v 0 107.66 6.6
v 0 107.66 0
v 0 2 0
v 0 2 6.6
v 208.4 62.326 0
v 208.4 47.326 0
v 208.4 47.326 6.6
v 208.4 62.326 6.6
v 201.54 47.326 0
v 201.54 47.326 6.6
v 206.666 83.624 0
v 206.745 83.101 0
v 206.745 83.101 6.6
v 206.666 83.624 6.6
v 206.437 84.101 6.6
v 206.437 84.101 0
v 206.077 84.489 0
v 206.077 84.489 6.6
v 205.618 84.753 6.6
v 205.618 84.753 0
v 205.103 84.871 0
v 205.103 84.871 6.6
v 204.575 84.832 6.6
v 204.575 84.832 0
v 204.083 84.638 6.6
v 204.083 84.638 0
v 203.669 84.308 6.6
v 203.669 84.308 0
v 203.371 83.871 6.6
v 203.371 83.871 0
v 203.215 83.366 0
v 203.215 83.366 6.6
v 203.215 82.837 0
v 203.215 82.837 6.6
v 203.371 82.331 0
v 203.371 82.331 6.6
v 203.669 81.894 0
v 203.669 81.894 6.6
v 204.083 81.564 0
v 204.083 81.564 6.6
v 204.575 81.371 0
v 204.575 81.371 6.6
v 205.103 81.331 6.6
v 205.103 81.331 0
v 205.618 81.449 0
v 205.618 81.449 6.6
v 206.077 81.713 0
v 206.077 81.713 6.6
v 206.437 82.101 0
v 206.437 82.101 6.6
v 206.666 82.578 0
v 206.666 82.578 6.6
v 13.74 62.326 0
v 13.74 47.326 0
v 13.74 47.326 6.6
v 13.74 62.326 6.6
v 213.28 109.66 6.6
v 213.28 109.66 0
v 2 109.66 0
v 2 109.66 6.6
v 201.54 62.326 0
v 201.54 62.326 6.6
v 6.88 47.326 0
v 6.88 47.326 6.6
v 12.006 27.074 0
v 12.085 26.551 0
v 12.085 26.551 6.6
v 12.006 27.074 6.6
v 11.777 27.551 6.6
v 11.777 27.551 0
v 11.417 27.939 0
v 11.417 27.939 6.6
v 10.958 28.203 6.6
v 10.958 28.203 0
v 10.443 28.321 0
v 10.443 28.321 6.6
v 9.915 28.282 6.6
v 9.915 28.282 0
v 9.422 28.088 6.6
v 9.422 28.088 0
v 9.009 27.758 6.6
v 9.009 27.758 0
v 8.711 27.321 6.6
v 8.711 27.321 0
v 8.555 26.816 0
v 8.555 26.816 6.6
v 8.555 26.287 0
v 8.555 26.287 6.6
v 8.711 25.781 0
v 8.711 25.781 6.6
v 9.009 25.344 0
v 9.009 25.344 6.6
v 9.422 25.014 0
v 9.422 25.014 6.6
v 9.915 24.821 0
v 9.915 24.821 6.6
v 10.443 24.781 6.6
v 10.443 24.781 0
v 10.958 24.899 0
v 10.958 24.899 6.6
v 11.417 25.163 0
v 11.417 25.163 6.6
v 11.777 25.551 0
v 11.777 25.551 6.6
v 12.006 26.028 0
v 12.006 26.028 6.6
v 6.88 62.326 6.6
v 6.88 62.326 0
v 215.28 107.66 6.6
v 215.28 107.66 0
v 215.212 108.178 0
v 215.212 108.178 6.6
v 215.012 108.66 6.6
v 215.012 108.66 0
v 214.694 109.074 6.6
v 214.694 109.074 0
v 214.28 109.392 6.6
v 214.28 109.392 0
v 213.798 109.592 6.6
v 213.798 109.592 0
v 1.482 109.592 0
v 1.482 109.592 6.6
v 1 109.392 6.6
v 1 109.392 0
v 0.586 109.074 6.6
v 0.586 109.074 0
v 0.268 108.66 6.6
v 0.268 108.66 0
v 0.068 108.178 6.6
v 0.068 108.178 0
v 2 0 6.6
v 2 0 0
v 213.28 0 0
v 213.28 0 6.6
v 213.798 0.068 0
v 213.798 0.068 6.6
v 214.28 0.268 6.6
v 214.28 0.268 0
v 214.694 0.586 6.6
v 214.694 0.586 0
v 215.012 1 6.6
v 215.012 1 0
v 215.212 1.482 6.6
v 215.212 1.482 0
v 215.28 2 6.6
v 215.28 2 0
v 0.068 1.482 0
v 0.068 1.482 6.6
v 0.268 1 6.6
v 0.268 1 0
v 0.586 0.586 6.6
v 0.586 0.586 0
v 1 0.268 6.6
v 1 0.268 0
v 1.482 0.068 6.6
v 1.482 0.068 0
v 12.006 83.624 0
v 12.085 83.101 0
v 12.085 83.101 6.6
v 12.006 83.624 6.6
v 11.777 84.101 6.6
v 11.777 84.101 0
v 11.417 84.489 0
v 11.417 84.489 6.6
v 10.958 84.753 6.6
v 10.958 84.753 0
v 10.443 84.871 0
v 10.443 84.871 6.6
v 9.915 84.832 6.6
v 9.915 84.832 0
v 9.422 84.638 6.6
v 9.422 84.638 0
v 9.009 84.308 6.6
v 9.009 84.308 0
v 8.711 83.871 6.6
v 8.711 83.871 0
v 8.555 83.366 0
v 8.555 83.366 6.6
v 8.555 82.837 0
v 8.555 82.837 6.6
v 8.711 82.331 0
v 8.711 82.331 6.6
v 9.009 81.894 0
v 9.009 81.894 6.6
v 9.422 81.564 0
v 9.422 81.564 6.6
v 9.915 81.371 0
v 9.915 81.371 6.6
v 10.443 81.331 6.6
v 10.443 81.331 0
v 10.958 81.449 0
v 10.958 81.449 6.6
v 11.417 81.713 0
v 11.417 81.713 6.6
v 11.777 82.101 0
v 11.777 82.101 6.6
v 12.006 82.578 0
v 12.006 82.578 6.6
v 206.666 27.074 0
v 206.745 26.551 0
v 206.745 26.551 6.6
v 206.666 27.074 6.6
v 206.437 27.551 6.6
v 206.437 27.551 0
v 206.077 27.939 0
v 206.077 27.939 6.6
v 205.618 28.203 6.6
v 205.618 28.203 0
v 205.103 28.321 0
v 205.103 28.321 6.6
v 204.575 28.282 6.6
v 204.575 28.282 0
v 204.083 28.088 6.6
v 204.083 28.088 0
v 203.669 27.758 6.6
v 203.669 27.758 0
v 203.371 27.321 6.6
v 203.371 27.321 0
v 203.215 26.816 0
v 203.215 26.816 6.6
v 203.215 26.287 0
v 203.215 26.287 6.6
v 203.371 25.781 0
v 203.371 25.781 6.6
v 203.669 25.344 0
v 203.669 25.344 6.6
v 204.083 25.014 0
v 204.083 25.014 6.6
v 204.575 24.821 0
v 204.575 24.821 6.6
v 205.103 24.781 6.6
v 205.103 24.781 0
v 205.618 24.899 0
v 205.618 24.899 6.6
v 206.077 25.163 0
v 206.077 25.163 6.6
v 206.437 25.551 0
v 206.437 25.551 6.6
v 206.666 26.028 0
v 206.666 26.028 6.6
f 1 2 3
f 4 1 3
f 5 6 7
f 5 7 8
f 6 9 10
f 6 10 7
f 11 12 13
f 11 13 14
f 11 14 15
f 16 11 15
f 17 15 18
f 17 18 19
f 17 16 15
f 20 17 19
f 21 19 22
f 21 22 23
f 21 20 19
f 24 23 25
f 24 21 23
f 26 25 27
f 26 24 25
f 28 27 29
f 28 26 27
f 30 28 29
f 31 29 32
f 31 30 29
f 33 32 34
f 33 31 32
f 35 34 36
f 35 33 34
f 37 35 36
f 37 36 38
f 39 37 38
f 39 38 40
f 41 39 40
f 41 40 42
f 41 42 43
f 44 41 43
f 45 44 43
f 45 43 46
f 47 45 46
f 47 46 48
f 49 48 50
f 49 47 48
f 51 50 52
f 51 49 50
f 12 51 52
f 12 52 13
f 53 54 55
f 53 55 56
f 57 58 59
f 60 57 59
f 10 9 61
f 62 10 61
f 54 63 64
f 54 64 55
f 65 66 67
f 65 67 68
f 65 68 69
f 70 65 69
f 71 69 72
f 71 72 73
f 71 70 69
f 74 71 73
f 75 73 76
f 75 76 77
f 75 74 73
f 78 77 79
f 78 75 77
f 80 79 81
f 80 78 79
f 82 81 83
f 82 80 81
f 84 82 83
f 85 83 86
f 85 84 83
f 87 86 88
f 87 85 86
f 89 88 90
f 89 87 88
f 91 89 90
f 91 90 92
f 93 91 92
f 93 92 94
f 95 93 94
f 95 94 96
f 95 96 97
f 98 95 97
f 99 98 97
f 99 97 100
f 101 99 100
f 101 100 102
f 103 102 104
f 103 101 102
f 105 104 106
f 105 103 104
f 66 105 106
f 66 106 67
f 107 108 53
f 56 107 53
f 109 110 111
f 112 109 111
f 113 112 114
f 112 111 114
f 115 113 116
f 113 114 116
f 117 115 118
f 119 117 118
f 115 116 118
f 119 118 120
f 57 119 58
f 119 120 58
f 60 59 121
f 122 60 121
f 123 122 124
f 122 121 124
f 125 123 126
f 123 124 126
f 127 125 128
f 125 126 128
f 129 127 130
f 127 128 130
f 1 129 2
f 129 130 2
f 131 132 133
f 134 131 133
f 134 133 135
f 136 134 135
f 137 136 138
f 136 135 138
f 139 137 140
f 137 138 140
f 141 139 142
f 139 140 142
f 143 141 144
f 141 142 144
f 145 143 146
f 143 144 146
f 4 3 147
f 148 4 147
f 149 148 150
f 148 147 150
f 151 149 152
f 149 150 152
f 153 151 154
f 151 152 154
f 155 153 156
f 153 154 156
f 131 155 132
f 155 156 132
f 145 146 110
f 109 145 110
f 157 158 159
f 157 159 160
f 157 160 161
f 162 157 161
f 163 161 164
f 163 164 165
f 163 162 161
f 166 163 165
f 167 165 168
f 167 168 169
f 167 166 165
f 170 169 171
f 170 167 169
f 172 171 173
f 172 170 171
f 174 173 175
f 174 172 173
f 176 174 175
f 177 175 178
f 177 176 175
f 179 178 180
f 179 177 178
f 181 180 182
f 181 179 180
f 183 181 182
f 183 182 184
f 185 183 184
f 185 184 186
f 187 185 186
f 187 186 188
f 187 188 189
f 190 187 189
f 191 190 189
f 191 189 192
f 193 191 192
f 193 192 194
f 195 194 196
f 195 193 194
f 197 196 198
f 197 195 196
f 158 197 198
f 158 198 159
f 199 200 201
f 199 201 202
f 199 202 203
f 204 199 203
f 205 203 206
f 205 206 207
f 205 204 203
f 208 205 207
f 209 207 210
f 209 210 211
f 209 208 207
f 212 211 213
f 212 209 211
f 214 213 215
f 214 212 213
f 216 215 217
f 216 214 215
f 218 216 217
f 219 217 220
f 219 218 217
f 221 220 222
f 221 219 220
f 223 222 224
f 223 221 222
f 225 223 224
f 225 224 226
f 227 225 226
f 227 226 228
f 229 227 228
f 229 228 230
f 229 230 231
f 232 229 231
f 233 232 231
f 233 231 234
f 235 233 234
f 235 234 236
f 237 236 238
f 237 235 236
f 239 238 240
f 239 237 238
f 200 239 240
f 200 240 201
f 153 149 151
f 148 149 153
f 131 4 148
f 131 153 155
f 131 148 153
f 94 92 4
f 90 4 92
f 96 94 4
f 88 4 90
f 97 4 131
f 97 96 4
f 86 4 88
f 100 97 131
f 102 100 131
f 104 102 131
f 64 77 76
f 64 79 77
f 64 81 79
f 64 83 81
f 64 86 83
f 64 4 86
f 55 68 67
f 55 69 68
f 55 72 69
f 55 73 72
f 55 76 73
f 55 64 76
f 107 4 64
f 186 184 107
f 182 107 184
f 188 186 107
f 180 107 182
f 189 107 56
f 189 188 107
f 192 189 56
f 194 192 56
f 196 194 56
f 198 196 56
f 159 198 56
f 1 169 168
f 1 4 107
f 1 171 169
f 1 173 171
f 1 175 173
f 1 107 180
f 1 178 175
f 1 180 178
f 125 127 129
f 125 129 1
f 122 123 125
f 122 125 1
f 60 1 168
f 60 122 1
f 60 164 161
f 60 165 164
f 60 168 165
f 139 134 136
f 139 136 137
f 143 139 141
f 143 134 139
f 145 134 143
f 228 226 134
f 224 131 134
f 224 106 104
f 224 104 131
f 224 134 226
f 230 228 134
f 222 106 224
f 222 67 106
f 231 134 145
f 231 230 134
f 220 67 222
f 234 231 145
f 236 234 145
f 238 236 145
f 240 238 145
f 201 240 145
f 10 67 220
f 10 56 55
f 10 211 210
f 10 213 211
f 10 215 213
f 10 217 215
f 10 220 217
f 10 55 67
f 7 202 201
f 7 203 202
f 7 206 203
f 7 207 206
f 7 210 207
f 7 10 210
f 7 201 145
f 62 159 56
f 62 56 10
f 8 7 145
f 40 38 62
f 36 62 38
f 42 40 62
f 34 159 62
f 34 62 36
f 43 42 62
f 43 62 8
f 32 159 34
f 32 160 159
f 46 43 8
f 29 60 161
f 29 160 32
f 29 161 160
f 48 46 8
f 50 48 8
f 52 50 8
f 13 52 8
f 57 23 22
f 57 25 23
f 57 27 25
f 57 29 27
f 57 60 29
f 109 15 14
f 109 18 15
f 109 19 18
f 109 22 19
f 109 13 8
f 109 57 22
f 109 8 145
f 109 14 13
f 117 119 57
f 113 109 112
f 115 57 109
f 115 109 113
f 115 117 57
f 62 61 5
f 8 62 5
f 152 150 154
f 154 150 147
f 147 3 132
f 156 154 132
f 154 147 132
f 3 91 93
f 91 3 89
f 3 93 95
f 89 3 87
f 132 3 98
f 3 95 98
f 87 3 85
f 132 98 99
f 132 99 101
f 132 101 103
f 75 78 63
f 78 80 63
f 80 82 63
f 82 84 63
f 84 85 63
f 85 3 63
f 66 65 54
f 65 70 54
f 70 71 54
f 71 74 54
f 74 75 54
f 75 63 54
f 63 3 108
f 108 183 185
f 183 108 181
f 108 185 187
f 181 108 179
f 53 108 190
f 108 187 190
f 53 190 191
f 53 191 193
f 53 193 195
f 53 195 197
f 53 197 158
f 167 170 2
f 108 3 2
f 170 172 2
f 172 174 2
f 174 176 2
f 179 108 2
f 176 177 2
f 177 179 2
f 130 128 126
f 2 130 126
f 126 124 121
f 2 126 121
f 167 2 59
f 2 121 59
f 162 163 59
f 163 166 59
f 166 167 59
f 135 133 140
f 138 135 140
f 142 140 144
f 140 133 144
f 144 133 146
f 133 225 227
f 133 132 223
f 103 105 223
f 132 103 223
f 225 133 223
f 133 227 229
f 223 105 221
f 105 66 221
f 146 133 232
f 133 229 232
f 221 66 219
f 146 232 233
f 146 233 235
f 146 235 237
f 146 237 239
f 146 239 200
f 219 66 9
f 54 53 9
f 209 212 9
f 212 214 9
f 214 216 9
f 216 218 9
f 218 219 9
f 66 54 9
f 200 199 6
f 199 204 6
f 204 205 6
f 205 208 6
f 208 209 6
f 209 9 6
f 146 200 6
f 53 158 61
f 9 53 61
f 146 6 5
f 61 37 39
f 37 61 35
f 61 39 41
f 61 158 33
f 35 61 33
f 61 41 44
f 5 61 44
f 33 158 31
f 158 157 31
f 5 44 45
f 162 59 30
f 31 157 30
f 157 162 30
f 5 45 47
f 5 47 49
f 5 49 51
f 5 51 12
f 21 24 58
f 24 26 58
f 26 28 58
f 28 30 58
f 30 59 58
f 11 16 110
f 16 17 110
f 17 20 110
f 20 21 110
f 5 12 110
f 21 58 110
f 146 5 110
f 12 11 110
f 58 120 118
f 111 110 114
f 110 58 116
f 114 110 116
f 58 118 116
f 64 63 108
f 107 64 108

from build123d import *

# Parameters (mm, degrees)
MODEL_R             = 1.775
MODEL_W             = 6.859999999
MODEL_H             = 15
MODEL_W_2           = 6.860000001
BOSS_EXTRUDE1_DEPTH = 6.6


with BuildPart() as part:
    # Model → Boss-Extrude1 (new body)
    with BuildSketch(Plane.XY):
        with BuildLine():
            Line((213.279999903, 109.659999999), (2.000000001, 109.659999999))
            ThreePointArc((2.000000001, 109.659999999), (0.585786439, 109.074213562), (0, 107.660000001))
            Line((0, 107.660000001), (0, 2.000000001))
            ThreePointArc((0, 2.000000001), (0.585786438, 0.585786438), (2.000000001, 0))
            Line((2.000000001, 0), (213.279999903, 0))
            ThreePointArc((213.279999903, 0), (214.694213466, 0.585786438), (215.279999904, 2.000000001))
            Line((215.279999904, 2.000000001), (215.279999904, 107.660000001))
            ThreePointArc((215.279999904, 107.660000001), (214.694213465, 109.074213562), (213.279999903, 109.659999999))
        make_face()
        with Locations((10.31, 83.101155497)):
            Circle(MODEL_R, mode=Mode.SUBTRACT)
        with Locations((10.31, 26.551155498)):
            Circle(MODEL_R, mode=Mode.SUBTRACT)
        with Locations((204.970000001, 26.551155498)):
            Circle(MODEL_R, mode=Mode.SUBTRACT)
        with Locations((204.970000001, 83.101155497)):
            Circle(MODEL_R, mode=Mode.SUBTRACT)
        with Locations((204.97, 54.826155497)):
            Rectangle(MODEL_W, MODEL_H, mode=Mode.SUBTRACT)
        with Locations((10.31, 54.826155497)):
            Rectangle(MODEL_W_2, MODEL_H, mode=Mode.SUBTRACT)
    extrude(amount=BOSS_EXTRUDE1_DEPTH)


solid = part.part
